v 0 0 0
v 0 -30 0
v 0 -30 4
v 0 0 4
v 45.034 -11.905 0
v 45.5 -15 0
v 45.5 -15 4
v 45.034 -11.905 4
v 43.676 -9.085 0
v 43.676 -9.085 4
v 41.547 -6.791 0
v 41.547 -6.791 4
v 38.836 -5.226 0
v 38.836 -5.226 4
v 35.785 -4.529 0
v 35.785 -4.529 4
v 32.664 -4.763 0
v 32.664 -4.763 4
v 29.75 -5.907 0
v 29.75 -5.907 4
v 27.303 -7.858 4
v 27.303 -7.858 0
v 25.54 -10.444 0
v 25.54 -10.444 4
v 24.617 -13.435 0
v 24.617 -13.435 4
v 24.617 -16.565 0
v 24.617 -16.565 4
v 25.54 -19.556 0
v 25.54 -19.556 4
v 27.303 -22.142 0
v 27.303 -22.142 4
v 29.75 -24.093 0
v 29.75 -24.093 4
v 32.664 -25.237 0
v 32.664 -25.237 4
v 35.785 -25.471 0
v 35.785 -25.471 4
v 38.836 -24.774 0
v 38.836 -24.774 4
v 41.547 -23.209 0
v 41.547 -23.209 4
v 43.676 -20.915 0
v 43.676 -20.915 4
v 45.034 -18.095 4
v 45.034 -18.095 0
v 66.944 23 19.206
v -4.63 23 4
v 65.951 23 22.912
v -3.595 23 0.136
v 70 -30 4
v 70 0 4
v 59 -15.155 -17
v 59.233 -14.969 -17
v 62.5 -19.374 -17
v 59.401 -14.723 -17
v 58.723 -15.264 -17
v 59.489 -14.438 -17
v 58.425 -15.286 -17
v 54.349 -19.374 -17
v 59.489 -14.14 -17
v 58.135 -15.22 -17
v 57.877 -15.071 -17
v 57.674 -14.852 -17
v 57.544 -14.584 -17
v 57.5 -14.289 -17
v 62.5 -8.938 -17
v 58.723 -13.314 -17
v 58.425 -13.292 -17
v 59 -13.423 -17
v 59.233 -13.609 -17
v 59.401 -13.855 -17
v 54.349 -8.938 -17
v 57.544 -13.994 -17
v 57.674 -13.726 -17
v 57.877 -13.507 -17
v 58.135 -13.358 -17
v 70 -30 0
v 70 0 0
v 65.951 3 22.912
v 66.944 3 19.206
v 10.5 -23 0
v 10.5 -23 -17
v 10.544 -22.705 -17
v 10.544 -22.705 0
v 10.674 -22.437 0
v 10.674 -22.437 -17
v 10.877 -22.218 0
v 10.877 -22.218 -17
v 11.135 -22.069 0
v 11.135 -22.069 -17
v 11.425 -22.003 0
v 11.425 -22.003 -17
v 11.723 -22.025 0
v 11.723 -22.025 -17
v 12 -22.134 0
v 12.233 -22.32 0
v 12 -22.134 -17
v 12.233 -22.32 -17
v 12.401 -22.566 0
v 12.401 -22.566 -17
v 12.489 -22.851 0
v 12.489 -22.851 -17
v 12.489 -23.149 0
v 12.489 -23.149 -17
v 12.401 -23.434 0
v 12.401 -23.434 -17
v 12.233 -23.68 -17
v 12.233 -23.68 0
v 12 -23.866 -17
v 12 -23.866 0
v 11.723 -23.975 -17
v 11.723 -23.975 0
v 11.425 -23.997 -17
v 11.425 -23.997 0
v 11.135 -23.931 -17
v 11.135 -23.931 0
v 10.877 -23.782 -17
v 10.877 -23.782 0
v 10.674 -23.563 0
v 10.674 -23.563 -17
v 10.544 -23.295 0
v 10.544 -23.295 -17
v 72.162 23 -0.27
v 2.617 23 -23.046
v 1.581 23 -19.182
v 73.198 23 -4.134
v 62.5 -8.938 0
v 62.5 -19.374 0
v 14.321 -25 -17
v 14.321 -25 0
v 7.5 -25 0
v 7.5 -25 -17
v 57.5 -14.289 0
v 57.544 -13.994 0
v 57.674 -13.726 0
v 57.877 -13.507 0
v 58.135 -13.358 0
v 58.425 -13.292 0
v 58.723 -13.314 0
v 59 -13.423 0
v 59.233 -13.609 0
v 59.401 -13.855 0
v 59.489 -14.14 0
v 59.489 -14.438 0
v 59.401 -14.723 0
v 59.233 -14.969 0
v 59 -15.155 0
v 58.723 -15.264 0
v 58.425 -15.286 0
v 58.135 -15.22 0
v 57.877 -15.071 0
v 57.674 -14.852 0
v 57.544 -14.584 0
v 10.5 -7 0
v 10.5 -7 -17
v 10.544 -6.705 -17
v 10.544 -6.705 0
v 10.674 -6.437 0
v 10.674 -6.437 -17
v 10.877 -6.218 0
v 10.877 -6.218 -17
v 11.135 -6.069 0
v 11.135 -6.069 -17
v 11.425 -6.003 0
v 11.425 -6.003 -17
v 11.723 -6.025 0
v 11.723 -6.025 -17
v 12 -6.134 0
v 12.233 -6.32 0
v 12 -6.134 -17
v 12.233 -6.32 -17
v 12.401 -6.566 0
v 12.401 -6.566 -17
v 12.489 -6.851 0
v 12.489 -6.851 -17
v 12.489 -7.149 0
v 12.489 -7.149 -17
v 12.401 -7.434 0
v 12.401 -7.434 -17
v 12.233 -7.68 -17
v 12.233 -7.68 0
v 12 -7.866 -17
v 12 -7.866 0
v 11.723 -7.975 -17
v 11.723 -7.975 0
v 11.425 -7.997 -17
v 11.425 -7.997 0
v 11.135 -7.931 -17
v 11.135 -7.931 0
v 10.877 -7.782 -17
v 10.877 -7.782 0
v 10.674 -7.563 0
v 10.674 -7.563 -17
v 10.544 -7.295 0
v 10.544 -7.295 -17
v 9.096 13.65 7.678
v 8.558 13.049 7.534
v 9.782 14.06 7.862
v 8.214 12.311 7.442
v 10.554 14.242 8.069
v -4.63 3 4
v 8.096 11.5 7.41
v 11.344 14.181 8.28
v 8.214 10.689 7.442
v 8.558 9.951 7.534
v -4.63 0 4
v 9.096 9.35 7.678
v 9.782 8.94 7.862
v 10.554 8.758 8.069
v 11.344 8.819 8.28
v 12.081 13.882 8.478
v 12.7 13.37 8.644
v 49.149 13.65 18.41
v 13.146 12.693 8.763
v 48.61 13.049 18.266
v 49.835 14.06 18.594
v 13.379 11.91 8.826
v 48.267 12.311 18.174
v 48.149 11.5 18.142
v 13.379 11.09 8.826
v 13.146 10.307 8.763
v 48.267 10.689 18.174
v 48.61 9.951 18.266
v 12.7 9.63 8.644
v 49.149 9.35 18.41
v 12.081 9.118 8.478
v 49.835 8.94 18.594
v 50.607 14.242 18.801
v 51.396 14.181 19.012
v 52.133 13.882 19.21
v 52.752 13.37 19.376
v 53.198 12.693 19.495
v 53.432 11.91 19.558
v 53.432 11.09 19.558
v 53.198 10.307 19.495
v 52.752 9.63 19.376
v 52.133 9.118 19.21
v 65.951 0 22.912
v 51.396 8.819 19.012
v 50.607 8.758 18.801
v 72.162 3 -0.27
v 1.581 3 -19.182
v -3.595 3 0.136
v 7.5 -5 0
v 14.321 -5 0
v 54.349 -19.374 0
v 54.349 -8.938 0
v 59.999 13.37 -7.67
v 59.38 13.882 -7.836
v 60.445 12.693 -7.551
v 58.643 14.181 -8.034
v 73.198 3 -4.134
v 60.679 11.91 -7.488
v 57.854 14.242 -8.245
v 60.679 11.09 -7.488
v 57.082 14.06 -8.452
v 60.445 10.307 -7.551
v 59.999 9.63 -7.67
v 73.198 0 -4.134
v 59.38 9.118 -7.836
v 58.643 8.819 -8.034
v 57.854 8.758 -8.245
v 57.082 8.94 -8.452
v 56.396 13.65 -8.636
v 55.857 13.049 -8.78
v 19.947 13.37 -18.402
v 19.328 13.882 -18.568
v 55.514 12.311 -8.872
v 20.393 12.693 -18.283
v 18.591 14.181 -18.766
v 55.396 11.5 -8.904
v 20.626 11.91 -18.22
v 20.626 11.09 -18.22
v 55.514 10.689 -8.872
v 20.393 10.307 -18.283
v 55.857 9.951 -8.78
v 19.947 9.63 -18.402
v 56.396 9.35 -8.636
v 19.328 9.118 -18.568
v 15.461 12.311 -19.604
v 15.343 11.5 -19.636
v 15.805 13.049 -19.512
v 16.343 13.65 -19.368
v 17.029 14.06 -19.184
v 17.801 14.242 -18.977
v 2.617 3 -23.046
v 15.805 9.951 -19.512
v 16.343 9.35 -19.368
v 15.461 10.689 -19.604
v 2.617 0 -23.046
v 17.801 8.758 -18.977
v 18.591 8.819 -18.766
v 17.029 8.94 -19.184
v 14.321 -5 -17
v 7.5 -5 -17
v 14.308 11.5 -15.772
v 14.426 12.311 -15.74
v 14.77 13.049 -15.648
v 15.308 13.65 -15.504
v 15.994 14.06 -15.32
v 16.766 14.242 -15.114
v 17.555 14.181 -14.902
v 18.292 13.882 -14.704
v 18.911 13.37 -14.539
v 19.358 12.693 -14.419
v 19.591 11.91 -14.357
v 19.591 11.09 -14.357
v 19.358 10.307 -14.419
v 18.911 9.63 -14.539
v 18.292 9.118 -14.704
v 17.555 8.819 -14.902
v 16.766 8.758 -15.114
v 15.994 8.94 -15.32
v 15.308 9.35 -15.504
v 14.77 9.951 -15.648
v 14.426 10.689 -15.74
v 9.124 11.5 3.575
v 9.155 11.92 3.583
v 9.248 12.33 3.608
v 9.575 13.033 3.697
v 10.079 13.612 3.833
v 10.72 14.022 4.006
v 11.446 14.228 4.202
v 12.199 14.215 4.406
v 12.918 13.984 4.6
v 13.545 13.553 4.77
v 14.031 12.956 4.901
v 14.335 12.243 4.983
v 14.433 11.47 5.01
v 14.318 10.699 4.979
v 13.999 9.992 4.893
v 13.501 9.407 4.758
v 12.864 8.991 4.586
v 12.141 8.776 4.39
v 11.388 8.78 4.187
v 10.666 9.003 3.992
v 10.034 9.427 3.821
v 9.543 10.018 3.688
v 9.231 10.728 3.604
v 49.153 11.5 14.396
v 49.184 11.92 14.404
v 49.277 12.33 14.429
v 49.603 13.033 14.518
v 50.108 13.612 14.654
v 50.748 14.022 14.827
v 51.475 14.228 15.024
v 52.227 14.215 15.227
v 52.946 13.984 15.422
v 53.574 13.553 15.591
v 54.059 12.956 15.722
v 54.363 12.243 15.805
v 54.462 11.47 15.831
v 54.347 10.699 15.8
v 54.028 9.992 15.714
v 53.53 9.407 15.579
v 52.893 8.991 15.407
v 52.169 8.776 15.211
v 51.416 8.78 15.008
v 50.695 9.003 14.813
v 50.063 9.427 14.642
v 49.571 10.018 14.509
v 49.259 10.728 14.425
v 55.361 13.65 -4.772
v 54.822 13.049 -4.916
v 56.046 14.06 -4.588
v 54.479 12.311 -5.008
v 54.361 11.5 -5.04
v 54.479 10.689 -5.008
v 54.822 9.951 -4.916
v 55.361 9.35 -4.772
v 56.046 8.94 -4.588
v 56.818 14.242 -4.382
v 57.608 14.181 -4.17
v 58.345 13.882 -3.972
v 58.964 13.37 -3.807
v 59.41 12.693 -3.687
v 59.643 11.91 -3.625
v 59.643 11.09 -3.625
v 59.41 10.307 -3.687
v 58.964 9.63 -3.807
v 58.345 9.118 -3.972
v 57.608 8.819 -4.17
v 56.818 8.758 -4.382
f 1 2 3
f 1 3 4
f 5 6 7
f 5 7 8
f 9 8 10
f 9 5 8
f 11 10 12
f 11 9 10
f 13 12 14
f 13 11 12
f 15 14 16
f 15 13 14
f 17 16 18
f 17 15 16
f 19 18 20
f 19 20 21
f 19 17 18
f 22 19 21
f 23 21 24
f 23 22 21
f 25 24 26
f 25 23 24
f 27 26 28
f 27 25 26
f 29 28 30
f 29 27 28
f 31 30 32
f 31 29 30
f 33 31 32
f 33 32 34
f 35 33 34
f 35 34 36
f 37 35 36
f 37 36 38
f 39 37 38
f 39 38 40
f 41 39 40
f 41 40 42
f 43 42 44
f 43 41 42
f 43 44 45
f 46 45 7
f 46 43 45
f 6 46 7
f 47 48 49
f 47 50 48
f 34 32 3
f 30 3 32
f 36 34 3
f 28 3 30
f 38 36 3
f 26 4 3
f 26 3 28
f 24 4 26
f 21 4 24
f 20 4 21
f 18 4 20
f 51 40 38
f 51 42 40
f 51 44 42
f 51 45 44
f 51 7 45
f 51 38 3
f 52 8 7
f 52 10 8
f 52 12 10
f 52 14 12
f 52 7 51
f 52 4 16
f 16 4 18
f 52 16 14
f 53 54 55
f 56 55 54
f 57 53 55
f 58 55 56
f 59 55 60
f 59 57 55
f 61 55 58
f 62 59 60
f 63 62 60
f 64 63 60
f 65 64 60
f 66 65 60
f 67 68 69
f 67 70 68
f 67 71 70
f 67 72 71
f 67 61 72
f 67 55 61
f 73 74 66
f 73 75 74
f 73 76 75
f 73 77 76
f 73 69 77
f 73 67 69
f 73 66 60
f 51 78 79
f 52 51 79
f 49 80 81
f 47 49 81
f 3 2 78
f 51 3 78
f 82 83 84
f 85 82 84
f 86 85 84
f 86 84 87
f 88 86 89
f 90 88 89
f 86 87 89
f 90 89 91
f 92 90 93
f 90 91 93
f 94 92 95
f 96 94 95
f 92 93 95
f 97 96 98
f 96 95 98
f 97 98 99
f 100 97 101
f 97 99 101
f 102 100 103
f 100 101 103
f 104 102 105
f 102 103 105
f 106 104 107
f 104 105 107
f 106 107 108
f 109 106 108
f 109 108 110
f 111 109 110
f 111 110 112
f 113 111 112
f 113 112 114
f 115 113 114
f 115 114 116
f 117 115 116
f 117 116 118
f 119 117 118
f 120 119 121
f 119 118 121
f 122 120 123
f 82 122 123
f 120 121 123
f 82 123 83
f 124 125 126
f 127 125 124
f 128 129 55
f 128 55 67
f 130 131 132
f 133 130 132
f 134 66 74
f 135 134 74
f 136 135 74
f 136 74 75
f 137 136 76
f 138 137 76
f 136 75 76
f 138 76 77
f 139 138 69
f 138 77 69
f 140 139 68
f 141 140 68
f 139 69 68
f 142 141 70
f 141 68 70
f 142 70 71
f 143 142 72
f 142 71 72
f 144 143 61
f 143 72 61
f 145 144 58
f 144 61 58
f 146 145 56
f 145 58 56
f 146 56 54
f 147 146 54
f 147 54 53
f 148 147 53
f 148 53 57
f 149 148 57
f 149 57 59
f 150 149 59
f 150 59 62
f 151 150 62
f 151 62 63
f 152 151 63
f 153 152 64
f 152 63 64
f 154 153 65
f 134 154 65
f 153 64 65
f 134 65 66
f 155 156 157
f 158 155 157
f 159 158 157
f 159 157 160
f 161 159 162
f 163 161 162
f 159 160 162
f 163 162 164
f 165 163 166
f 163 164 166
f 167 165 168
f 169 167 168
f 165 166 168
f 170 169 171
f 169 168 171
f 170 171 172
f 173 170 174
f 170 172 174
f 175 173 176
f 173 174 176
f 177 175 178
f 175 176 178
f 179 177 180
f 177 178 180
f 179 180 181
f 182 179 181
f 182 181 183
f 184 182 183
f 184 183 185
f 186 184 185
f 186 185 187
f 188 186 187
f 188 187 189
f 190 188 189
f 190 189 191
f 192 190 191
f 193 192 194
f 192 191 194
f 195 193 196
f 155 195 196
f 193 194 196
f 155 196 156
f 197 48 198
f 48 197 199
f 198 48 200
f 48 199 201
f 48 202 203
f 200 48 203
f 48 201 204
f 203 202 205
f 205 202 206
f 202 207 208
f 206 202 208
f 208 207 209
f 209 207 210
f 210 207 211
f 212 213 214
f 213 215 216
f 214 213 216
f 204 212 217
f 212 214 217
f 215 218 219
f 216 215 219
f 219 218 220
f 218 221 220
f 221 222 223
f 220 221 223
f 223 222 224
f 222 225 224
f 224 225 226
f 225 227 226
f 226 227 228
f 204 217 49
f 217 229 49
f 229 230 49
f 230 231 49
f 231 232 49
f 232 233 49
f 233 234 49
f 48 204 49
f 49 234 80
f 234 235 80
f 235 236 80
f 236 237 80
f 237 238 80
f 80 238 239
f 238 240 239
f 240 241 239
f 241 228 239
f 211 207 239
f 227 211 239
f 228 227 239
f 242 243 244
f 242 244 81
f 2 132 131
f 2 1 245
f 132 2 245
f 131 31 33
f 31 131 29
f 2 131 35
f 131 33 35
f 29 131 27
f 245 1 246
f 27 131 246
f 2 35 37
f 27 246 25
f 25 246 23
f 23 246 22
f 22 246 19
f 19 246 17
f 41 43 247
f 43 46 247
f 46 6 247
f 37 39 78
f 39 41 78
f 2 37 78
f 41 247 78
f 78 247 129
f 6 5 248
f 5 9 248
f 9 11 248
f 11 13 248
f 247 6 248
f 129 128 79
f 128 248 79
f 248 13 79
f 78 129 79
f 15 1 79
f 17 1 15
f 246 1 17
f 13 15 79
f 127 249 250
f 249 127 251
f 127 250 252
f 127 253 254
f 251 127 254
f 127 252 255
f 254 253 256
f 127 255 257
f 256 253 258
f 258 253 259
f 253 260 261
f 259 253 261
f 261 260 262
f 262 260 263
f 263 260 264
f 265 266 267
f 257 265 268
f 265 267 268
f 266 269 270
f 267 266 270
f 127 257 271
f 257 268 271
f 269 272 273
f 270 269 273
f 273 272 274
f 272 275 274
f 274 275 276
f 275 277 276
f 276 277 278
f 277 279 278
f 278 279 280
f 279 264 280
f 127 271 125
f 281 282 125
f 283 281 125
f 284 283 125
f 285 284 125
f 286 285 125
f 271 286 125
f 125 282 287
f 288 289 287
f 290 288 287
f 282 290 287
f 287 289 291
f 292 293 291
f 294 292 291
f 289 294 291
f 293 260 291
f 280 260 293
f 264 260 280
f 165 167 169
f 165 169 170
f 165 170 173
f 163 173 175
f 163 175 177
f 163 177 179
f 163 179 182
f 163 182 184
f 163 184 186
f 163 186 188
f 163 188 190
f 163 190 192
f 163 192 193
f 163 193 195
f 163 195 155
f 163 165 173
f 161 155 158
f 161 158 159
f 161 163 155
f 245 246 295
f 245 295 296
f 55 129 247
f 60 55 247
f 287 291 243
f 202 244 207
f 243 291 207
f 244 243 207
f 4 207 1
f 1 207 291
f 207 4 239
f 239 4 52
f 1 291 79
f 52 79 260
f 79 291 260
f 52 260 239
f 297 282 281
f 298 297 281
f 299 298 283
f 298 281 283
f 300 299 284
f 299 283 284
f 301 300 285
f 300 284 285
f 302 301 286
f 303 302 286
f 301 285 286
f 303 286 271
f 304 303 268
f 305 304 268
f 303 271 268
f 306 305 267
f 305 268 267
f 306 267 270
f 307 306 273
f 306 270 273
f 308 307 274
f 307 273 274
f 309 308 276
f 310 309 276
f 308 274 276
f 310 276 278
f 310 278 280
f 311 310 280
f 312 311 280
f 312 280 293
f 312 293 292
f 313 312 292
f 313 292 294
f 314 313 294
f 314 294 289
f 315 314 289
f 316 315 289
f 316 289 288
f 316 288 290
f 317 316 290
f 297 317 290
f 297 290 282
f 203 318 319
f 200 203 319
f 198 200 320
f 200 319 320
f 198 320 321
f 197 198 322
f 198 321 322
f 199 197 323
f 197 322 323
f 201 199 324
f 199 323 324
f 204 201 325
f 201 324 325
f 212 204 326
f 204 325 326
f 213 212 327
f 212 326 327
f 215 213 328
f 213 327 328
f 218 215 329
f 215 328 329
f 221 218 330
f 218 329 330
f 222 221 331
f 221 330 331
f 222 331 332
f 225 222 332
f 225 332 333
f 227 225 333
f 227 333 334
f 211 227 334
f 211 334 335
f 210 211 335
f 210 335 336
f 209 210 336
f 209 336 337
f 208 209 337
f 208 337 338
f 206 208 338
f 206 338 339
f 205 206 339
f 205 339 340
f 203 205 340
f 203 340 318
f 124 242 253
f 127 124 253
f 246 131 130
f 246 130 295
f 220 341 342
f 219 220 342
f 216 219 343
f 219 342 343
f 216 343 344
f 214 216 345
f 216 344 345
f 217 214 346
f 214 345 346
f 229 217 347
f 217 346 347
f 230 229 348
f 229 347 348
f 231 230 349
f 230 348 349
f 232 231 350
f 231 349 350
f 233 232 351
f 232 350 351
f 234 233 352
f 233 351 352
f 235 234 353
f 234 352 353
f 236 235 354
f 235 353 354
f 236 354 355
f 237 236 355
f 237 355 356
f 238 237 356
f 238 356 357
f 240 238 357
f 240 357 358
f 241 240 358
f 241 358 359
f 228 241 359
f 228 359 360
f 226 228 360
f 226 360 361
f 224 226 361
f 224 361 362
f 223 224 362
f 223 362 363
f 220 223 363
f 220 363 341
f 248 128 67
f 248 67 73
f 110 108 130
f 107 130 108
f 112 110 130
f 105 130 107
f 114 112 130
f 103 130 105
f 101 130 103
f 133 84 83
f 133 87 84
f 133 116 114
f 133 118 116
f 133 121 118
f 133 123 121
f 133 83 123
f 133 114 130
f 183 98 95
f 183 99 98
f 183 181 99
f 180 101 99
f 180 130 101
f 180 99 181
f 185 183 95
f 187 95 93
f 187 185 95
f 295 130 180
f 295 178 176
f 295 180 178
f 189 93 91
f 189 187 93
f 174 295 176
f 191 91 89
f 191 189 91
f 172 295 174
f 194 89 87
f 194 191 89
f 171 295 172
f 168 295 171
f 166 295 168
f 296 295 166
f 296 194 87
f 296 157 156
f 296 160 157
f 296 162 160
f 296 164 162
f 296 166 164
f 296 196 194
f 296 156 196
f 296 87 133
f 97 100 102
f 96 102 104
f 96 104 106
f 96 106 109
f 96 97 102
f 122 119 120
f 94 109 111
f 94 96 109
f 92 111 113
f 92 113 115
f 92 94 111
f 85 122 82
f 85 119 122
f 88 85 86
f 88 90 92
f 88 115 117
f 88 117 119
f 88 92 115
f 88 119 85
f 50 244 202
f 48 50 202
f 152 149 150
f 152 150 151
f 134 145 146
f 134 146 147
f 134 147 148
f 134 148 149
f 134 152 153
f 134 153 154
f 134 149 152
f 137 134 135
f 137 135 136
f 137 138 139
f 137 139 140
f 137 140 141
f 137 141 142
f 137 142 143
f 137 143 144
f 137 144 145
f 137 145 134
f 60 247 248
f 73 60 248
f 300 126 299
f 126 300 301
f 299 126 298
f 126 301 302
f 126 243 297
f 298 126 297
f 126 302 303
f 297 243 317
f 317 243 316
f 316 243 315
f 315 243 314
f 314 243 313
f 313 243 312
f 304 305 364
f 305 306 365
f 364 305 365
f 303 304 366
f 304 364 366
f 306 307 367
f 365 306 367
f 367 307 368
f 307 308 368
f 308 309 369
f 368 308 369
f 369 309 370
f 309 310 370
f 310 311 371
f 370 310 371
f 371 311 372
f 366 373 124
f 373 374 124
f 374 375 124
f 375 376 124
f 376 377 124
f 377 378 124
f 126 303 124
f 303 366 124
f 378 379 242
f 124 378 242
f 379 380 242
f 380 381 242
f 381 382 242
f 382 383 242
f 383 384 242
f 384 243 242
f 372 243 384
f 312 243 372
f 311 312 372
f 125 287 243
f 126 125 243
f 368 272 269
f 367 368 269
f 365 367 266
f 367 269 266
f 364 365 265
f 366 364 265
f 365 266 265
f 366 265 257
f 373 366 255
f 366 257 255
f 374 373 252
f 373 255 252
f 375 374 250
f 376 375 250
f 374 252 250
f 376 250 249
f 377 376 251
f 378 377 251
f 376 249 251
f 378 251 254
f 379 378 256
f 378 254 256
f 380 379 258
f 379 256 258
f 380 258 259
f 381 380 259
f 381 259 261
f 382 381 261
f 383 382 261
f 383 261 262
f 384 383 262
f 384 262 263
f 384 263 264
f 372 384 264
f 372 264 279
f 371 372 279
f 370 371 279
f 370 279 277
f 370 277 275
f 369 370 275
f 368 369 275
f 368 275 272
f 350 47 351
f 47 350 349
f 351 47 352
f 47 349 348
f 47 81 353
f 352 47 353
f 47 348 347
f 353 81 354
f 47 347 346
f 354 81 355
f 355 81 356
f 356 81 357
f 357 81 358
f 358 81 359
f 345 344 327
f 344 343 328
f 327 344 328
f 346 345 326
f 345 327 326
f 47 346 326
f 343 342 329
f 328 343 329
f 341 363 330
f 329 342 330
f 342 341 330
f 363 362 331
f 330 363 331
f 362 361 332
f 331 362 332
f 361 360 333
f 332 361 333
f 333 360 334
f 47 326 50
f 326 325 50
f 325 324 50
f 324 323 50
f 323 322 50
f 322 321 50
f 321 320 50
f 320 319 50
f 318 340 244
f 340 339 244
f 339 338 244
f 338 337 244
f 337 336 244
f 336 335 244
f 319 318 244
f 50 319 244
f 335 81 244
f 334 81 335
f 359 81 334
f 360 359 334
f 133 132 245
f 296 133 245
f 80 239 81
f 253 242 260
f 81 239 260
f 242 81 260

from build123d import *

# Parameters (mm, degrees)
SKETCH1_W           = 70
SKETCH1_H           = 30
SKETCH1_R           = 10.5
BOSS_EXTRUDE1_DEPTH = 4
SKETCH3_W           = 8.150987667
SKETCH3_H           = 10.43538234
SKETCH3_W_2         = 6.820916115
SKETCH3_H_2         = 20
BOSS_EXTRUDE2_DEPTH = 17
SKETCH4_R           = 1
CUT_EXTRUDE1_DEPTH  = 17
BOSS_EXTRUDE4_DEPTH = 3
BOSS_EXTRUDE5_DEPTH = 20
SKETCH10_R          = 2.75
CUT_EXTRUDE2_DEPTH  = 47.267747797


with BuildPart() as part:
    # Sketch1 → Boss-Extrude1 (new body)
    with BuildSketch(Plane.XY):
        with Locations((35, -15)):
            Rectangle(SKETCH1_W, SKETCH1_H)
        with Locations((35, -15)):
            Circle(SKETCH1_R, mode=Mode.SUBTRACT)
    extrude(amount=BOSS_EXTRUDE1_DEPTH)

    # Sketch3 → Boss-Extrude2 (add)
    with BuildSketch(Plane(origin=(0, 0, 0), x_dir=(-1, 0, 0), z_dir=(0, 0, -1))):
        with Locations((-58.424506167, -14.156074174)):
            Rectangle(SKETCH3_W, SKETCH3_H)
        with Locations((-10.910458058, -15)):
            Rectangle(SKETCH3_W_2, SKETCH3_H_2)
    extrude(amount=BOSS_EXTRUDE2_DEPTH)

    # Sketch4 → Cut-Extrude1 (cut)
    with BuildSketch(Plane(origin=(0, 0, -17), x_dir=(-1, 0, 0), z_dir=(0, 0, -1))):
        with Locations((-58.5, -14.289099526)):
            Circle(SKETCH4_R)
        with Locations((-11.5, -7)):
            Circle(SKETCH4_R)
        with Locations((-11.5, -23)):
            Circle(SKETCH4_R)
    extrude(amount=-CUT_EXTRUDE1_DEPTH, mode=Mode.SUBTRACT)

    # Sketch7 → Boss-Extrude4 (add)
    with BuildSketch(Plane(origin=(0, 0, 0), x_dir=(1, 0, 0), z_dir=(0, 1, 0))):
        Polygon((-4.630368757, -4), (65.950788783, -22.912164164), (73.197722046, 4.133758972), (2.616564506, 23.045923136), align=None)
    extrude(amount=BOSS_EXTRUDE4_DEPTH)

    # Sketch9 → Boss-Extrude5 (add)
    with BuildSketch(Plane(origin=(0, 3, 0), x_dir=(1, 0, 0), z_dir=(0, 1, 0))):
        Polygon((-4.630368757, -4), (65.950788783, -22.912164164), (66.943950204, -19.205635281), (-3.595092577, -0.136296695), align=None)
        Polygon((2.616564506, 23.045923136), (1.581288325, 19.182219831), (72.162445865, 0.270055667), (73.197722046, 4.133758972), align=None)
    extrude(amount=BOSS_EXTRUDE5_DEPTH)

    # Sketch10 → Cut-Extrude2 (cut, through all)
    with BuildSketch(Plane(origin=(5.936757371, 0, -22.156280139), x_dir=(-0.965925826, 0, -0.258819045), z_dir=(0.258819045, 0, -0.965925826))):
        with Locations((-53.953749554, 11.5)):
            Circle(SKETCH10_R)
        with Locations((-12.488324975, 11.5)):
            Circle(SKETCH10_R)
    extrude(amount=-CUT_EXTRUDE2_DEPTH, mode=Mode.SUBTRACT)


solid = part.part
